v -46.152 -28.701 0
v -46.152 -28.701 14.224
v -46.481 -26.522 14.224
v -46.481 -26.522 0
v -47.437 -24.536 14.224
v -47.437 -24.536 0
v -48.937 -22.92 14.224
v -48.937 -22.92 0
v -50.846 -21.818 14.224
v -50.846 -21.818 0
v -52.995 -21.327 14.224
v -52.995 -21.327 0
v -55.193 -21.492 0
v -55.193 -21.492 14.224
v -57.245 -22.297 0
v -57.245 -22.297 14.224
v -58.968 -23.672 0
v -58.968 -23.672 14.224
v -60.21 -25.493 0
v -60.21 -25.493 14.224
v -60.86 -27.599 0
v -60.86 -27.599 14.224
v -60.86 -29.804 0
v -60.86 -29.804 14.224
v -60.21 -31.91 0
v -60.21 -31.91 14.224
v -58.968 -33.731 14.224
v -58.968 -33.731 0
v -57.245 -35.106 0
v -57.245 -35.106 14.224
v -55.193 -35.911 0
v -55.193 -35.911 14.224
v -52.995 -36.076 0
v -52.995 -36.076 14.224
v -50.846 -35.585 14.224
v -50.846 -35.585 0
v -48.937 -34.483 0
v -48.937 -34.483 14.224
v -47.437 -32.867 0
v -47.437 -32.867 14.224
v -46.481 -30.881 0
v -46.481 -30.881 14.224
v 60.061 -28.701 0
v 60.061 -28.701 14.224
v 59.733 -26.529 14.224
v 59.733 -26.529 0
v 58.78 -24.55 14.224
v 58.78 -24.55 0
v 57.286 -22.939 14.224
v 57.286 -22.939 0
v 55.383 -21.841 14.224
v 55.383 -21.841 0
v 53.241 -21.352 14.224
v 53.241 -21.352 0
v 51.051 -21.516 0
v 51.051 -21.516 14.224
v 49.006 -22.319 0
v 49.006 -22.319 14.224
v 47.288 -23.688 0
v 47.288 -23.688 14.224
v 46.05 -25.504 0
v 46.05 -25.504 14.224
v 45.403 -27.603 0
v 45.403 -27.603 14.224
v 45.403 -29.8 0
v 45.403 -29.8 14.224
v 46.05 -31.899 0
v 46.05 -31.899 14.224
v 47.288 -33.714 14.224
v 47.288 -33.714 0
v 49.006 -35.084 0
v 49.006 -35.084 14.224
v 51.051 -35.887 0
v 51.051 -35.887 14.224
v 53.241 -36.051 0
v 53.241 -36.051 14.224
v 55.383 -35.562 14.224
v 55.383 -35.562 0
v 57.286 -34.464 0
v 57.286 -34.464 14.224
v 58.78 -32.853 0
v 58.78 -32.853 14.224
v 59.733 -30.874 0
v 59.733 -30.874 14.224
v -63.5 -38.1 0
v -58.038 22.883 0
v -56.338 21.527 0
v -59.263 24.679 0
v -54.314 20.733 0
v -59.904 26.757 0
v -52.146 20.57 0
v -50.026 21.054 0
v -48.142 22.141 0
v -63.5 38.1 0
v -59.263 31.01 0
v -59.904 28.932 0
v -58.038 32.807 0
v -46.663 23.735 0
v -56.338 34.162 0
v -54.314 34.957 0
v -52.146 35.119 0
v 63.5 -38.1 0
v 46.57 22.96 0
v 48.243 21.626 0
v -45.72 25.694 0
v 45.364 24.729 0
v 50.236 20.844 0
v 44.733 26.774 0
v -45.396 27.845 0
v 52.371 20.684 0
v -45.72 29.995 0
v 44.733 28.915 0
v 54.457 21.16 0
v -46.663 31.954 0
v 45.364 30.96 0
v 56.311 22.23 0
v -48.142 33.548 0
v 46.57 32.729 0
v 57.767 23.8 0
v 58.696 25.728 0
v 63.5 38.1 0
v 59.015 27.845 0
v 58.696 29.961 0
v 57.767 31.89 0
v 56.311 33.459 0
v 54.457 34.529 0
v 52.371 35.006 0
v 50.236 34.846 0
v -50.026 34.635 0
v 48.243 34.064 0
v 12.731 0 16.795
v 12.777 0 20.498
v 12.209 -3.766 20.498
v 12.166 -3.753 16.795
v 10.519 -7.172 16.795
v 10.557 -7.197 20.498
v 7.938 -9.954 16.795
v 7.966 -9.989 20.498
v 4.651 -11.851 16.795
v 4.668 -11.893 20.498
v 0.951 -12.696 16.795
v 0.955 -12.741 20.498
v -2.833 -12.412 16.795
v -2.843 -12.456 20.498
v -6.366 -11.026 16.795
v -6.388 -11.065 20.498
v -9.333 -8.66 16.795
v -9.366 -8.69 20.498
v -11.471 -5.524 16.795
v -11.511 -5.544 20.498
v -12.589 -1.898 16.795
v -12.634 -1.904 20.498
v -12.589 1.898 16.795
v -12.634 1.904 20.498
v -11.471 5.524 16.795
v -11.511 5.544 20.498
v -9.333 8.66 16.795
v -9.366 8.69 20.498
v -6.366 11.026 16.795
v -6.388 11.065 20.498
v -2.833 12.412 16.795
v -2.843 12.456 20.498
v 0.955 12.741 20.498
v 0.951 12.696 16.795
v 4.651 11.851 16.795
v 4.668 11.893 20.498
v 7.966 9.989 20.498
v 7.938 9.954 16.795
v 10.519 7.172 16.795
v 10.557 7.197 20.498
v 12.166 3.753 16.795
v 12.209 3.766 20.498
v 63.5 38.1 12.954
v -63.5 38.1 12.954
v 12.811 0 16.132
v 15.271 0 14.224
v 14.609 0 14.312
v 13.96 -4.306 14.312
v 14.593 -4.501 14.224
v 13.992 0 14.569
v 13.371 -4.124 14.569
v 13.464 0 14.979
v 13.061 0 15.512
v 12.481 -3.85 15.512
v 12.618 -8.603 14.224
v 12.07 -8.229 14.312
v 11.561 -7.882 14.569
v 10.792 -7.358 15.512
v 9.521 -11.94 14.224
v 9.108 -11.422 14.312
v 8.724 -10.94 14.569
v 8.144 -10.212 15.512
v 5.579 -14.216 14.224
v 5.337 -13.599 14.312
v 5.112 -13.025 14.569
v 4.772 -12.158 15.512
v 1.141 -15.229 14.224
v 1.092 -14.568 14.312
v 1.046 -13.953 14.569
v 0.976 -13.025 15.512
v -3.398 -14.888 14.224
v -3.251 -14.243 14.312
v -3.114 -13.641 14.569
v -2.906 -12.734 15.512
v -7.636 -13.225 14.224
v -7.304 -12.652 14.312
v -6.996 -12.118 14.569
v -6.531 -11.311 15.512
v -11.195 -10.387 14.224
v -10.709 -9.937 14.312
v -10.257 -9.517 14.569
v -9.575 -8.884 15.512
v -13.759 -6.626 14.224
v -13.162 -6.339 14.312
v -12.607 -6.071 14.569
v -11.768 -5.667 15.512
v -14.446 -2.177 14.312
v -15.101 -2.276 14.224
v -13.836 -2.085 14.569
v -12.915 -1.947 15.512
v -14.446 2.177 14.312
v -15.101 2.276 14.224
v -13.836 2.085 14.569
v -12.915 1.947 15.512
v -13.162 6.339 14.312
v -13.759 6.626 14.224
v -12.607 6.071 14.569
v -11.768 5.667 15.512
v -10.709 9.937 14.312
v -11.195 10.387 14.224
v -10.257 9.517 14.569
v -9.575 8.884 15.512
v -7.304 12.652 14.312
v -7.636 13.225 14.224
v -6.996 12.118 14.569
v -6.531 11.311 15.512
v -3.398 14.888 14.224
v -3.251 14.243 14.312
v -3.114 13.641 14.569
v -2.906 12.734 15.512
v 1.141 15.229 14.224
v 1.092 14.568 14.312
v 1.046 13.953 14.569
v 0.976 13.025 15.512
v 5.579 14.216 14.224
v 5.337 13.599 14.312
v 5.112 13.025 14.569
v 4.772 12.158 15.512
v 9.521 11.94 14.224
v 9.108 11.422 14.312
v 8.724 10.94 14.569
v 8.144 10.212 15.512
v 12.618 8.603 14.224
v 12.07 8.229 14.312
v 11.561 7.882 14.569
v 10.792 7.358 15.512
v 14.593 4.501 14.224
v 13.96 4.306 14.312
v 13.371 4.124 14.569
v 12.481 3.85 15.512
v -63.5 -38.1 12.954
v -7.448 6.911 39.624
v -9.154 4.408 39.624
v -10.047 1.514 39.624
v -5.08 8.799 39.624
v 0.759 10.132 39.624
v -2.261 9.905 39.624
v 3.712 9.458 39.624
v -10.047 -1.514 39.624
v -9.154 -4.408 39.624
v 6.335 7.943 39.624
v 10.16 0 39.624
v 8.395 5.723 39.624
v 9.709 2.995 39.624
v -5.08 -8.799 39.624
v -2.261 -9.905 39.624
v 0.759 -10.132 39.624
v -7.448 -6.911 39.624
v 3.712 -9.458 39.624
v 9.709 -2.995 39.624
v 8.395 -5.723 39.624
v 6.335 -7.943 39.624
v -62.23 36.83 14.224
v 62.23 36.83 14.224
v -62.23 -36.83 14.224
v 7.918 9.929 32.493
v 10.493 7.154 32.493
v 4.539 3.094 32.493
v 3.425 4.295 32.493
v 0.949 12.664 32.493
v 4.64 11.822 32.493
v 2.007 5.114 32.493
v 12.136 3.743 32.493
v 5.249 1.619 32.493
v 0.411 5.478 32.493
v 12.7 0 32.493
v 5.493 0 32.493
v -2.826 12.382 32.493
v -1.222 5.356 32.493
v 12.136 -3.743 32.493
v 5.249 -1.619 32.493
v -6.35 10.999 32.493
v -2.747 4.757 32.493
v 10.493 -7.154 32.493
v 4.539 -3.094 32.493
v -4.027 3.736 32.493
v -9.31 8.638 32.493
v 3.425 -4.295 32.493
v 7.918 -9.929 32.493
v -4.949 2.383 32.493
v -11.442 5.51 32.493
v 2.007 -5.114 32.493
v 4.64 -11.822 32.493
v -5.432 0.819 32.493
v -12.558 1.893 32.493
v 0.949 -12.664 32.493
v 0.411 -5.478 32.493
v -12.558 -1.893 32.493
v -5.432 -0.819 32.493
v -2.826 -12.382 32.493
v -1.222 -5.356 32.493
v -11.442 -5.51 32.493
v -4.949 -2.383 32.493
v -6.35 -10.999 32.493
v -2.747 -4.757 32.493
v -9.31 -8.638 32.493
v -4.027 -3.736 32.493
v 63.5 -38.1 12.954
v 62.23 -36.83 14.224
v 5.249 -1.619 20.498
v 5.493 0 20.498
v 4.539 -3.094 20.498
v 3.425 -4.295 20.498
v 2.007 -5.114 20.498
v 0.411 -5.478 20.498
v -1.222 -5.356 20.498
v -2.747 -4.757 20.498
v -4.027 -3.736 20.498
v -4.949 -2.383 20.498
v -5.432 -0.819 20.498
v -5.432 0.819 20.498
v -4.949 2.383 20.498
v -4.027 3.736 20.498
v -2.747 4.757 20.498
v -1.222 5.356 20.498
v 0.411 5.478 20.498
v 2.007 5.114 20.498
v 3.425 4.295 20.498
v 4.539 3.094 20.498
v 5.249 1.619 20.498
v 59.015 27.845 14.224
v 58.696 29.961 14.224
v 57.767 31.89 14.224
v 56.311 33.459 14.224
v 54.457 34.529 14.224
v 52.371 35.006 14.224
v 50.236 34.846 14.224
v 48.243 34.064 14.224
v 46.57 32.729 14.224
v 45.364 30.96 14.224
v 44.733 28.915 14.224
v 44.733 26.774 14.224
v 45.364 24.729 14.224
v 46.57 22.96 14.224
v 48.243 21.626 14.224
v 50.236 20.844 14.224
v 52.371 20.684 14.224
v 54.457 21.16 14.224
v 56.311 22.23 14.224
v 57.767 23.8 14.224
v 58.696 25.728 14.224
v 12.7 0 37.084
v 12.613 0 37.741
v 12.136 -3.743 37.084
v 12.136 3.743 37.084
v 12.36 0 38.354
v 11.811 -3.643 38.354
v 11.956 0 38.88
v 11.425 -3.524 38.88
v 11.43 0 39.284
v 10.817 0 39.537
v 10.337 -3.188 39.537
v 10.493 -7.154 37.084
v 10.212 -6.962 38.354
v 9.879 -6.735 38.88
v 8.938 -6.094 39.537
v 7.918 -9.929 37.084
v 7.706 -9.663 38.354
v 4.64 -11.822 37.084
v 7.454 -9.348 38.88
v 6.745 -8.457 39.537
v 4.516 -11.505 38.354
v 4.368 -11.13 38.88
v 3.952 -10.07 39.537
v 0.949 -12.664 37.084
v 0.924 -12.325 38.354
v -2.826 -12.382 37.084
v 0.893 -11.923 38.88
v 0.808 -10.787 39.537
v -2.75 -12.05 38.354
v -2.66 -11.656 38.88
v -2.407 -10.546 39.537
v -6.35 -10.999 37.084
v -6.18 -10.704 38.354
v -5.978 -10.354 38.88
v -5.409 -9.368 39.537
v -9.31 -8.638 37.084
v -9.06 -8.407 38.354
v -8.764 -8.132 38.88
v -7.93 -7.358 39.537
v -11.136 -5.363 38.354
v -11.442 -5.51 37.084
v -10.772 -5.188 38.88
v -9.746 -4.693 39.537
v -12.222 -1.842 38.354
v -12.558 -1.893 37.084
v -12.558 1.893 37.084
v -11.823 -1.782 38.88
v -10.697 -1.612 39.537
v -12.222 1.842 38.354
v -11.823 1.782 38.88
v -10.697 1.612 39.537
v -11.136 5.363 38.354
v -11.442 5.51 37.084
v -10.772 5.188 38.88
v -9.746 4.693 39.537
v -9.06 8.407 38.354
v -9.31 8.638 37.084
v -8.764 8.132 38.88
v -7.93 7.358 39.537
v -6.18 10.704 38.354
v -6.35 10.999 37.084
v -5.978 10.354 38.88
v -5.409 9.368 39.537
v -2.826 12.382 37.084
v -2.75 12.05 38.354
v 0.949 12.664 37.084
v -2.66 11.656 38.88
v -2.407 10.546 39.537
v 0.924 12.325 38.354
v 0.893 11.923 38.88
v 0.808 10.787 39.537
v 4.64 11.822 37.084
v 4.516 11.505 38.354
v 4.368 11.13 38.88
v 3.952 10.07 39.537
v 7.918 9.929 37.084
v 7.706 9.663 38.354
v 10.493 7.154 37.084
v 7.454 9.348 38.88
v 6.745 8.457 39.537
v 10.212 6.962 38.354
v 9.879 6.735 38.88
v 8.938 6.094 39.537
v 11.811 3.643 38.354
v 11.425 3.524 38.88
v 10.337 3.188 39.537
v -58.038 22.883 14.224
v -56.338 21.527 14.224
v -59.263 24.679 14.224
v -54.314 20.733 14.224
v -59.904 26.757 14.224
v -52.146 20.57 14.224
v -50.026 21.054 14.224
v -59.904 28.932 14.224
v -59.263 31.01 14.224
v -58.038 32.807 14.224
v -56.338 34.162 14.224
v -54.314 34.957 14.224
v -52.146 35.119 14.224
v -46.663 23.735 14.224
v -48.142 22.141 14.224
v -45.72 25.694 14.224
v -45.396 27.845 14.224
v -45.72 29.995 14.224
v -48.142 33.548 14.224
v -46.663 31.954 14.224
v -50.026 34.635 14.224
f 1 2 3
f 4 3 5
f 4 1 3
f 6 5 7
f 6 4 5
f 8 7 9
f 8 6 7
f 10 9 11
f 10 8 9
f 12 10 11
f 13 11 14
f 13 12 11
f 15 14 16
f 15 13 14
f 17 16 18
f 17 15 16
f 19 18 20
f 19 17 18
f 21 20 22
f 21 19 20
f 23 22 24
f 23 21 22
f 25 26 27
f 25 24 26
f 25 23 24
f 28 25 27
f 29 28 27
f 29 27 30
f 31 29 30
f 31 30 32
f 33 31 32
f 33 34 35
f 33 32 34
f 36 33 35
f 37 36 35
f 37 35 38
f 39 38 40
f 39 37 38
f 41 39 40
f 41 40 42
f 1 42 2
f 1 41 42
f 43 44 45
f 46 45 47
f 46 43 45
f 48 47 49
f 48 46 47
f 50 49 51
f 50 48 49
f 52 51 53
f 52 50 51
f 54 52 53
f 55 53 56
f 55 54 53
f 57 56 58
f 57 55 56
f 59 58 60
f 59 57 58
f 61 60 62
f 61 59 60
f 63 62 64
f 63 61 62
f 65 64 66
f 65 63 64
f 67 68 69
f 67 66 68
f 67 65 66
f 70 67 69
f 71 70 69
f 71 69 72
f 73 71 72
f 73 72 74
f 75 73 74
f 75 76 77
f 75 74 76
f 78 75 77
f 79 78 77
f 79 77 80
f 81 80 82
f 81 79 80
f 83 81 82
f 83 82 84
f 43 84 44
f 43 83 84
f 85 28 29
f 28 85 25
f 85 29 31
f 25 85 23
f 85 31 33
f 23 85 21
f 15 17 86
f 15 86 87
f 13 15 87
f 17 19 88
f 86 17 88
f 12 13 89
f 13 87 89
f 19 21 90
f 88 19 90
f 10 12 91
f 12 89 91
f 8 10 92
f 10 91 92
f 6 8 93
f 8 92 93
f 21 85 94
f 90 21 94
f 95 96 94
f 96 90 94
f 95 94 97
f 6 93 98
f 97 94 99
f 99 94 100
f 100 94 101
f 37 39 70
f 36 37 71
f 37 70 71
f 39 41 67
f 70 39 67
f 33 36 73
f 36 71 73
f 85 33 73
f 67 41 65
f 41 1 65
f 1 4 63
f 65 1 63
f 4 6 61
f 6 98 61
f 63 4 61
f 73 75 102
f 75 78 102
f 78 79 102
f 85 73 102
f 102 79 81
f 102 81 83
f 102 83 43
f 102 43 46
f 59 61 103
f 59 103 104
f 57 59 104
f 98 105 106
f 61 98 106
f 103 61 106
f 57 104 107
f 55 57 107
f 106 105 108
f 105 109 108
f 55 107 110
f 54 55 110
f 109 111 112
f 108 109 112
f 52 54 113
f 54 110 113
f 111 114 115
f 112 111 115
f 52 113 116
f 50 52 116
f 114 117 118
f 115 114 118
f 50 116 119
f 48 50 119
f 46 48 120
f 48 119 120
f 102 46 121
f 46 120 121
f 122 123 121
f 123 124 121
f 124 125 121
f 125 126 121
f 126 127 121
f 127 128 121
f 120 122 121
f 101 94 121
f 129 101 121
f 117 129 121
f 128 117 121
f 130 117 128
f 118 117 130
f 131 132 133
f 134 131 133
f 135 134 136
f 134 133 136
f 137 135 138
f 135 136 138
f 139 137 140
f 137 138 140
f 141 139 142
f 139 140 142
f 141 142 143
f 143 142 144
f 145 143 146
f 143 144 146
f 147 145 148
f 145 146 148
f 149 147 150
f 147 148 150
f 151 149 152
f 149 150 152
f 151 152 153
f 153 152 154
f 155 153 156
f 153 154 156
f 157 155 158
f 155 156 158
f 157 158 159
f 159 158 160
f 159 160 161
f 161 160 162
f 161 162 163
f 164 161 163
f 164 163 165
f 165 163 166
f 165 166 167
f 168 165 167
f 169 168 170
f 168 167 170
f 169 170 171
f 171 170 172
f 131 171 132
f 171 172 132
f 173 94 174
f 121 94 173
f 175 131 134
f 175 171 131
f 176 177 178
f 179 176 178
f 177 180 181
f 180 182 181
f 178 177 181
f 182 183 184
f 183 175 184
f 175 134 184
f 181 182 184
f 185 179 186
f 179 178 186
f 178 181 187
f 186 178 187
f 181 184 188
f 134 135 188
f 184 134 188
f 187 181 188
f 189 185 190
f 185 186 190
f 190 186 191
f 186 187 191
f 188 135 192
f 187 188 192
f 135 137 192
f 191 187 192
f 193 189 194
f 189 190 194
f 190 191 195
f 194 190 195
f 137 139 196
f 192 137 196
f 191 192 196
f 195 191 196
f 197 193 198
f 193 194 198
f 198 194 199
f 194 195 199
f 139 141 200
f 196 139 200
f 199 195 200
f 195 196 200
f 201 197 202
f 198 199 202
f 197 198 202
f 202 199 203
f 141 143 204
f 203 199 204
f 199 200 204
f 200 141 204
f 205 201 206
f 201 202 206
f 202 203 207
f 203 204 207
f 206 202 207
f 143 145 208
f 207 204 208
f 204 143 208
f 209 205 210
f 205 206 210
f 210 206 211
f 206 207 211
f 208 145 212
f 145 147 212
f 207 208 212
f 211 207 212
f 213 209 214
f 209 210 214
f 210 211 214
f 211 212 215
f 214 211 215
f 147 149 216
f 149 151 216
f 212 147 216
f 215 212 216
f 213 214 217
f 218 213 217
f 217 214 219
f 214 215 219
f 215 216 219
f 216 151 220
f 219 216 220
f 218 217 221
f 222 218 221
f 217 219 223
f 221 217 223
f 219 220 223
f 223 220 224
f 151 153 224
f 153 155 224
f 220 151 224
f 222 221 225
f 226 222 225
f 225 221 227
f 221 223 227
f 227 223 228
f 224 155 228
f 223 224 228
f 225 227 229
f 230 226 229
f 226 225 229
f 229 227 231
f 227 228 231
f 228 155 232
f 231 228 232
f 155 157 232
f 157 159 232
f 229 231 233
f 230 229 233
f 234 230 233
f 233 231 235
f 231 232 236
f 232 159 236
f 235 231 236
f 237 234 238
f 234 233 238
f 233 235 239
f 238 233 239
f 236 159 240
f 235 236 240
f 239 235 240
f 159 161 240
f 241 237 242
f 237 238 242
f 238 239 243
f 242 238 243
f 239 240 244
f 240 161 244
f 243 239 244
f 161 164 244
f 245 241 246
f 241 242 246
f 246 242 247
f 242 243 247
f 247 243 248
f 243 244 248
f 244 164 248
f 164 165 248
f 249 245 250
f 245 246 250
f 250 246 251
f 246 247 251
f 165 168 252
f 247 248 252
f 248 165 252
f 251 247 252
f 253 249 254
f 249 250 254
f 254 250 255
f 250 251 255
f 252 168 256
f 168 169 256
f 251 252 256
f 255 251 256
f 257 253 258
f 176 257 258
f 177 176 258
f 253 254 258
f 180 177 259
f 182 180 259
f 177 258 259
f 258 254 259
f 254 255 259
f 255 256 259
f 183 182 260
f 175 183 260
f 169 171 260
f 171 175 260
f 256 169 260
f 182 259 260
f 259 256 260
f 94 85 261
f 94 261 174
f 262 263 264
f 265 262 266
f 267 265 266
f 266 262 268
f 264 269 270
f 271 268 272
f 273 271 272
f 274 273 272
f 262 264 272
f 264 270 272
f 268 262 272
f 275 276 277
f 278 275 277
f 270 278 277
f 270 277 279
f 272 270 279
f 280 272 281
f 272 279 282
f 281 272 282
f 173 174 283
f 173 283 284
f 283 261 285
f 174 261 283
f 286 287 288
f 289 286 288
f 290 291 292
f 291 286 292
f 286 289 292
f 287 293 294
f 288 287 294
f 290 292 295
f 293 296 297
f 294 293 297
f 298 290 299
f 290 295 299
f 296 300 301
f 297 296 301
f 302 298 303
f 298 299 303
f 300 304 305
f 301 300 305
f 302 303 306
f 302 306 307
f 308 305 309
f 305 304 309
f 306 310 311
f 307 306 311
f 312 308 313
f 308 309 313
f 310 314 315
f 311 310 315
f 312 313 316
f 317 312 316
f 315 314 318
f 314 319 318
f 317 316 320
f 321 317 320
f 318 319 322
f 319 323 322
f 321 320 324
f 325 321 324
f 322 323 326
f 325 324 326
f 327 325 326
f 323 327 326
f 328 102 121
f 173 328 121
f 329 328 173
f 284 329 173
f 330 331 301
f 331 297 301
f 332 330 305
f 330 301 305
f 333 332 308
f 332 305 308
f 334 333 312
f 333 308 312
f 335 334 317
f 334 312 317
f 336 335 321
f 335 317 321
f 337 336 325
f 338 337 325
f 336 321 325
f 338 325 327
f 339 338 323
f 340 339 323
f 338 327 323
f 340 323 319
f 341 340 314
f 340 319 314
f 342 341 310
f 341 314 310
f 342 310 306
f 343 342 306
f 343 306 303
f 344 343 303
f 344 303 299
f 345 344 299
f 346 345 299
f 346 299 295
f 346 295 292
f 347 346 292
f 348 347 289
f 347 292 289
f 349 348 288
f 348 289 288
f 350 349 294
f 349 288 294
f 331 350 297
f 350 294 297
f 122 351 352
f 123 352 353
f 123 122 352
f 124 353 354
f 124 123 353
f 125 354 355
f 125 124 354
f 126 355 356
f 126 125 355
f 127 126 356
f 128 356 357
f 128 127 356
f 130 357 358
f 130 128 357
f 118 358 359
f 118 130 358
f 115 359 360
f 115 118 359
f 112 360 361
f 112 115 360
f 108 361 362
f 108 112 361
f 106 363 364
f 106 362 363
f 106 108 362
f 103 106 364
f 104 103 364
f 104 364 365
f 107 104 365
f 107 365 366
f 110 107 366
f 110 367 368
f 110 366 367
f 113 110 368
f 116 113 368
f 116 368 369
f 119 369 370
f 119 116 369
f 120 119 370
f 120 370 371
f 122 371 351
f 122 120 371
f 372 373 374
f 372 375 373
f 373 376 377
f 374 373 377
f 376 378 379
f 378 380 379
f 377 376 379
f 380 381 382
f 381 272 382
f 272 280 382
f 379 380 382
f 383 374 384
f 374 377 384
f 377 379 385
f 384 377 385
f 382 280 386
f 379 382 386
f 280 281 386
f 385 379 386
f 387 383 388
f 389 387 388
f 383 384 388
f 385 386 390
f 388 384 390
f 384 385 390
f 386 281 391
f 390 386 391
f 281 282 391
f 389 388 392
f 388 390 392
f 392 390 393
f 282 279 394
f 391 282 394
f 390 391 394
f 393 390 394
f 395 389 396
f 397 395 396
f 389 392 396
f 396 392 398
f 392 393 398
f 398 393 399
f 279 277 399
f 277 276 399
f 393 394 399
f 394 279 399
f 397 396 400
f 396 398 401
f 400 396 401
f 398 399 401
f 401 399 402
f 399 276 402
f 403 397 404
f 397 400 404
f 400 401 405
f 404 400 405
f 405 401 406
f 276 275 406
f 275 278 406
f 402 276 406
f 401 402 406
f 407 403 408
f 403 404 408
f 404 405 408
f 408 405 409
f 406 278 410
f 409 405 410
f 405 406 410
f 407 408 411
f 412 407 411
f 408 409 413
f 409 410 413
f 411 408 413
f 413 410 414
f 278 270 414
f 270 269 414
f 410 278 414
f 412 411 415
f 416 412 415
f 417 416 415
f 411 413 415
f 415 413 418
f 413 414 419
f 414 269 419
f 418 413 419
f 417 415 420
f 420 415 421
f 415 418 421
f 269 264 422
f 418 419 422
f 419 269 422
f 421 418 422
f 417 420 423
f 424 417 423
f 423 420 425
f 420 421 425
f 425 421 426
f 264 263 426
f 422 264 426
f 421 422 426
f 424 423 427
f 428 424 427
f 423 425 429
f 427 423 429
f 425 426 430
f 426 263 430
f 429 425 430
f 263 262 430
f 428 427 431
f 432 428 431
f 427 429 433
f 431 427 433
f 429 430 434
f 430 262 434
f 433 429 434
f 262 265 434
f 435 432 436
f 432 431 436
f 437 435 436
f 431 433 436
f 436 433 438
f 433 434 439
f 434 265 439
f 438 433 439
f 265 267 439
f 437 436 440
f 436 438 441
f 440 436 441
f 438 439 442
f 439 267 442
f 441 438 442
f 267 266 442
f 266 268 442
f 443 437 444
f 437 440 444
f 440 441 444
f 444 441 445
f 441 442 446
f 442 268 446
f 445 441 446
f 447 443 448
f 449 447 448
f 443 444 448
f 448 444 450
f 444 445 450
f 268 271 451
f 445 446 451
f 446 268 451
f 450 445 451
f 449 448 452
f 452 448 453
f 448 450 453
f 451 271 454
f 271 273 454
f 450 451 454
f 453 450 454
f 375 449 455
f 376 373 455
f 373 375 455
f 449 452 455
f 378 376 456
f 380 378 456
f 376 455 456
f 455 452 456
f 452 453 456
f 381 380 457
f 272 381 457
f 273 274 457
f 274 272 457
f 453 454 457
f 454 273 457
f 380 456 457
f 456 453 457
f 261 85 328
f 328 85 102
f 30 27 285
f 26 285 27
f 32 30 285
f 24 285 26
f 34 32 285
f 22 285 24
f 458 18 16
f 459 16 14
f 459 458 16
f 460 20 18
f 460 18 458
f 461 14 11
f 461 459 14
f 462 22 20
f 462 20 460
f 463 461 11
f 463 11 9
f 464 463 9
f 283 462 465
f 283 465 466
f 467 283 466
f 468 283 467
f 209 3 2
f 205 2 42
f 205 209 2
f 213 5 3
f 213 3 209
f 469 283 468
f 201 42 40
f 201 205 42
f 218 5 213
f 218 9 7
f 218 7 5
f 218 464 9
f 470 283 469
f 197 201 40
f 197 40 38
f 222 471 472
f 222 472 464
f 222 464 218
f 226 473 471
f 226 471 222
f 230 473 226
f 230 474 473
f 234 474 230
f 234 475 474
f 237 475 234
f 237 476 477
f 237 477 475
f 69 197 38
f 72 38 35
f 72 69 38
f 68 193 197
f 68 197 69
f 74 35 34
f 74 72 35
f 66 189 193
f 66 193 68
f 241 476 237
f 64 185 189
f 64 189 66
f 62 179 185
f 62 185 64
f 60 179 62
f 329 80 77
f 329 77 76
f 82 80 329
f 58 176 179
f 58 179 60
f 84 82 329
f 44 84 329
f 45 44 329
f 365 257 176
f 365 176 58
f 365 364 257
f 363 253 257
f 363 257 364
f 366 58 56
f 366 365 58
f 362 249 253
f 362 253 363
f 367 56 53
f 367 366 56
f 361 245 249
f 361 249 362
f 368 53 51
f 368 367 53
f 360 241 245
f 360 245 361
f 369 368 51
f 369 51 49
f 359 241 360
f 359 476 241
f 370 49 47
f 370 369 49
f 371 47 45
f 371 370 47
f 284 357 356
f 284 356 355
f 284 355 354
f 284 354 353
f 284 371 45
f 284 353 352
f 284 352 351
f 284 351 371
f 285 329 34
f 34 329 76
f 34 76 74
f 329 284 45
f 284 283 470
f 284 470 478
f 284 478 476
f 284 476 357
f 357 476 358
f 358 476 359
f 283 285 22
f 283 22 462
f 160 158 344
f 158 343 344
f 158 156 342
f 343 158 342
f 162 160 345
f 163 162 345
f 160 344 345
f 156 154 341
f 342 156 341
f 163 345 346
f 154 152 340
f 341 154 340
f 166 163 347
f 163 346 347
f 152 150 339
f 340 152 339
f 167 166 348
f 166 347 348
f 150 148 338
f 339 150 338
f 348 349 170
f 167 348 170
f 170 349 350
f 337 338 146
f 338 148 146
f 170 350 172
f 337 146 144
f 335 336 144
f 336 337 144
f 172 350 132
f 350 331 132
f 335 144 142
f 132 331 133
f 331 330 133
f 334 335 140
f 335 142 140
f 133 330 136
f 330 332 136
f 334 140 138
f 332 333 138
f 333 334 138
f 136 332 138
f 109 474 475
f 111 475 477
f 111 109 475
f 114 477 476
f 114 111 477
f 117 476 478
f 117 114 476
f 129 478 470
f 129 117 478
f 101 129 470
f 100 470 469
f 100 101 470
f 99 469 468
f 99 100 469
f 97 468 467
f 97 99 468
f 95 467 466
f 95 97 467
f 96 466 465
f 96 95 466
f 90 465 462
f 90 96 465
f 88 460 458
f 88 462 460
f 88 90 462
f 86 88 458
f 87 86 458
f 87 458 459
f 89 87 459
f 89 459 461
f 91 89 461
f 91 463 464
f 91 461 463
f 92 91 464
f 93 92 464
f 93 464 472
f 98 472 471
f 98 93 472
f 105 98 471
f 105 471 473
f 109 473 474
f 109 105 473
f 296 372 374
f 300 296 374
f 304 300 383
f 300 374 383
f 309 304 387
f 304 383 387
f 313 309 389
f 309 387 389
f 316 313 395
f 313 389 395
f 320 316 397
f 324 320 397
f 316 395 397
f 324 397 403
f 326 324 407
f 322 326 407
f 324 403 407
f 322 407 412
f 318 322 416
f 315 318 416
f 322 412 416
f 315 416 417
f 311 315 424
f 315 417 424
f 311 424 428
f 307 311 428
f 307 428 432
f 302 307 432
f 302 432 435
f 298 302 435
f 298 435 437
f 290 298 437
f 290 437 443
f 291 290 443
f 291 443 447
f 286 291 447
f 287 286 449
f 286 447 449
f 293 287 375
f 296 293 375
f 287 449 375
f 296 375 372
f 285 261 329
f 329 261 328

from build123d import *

# Parameters (mm, degrees)
F0_W     = 127
F0_H     = 76.2
F1_DEPTH = 14.224
F2_R     = 7.295041
F2_R_2   = 7.180955
F2_R_3   = 7.370116
F2_R_4   = 7.39498
F3_DEPTH = 27.94
F6_R     = 2.54
F7_SIZE  = 1.27


with BuildPart() as f1:
    # F0 (on Top) → F1 (new body)
    with BuildSketch(Plane.XY):
        Rectangle(F0_W, F0_H)
    extrude(amount=F1_DEPTH)

    # F2 (on Top) → F3 (cut)
    with BuildSketch(Plane.XY):
        with Locations((-52.690696, 27.844677)):
            Circle(F2_R)
        with Locations((51.833939, 27.844677)):
            Circle(F2_R_2)
        with Locations((52.6907, -28.701432)):
            Circle(F2_R_3)
        with Locations((-53.547453, -28.701432)):
            Circle(F2_R_4)
    extrude(amount=F3_DEPTH, mode=Mode.SUBTRACT)

    # F4 (on Front) → F5 (revolve)
    with BuildSketch(Plane.XZ):
        Polygon((12.7, 39.624), (0, 39.624), (0, 14.224), (12.7, 14.224), (12.776617, 20.498227), (5.493246, 20.498227), (5.493246, 25.638863), (5.493246, 32.492936), (12.7, 32.492936), align=None)
    revolve(axis=Axis((0, 0, 26.924), (0, 0, -1)))

    # F6
    f6_edges = [f1.edges().sort_by_distance(p)[0] for p in [
        (-12.7, 0, 39.624),
        (-12.7, 0, 14.224),
    ]]
    fillet(f6_edges, radius=F6_R)

    # F7
    f7_edges = [f1.edges().sort_by_distance(p)[0] for p in [
        (0, -38.1, 14.224),
        (63.5, 0, 14.224),
        (0, 38.1, 14.224),
        (-63.5, 0, 14.224),
    ]]
    chamfer(f7_edges, length=F7_SIZE)


solid = f1.part
